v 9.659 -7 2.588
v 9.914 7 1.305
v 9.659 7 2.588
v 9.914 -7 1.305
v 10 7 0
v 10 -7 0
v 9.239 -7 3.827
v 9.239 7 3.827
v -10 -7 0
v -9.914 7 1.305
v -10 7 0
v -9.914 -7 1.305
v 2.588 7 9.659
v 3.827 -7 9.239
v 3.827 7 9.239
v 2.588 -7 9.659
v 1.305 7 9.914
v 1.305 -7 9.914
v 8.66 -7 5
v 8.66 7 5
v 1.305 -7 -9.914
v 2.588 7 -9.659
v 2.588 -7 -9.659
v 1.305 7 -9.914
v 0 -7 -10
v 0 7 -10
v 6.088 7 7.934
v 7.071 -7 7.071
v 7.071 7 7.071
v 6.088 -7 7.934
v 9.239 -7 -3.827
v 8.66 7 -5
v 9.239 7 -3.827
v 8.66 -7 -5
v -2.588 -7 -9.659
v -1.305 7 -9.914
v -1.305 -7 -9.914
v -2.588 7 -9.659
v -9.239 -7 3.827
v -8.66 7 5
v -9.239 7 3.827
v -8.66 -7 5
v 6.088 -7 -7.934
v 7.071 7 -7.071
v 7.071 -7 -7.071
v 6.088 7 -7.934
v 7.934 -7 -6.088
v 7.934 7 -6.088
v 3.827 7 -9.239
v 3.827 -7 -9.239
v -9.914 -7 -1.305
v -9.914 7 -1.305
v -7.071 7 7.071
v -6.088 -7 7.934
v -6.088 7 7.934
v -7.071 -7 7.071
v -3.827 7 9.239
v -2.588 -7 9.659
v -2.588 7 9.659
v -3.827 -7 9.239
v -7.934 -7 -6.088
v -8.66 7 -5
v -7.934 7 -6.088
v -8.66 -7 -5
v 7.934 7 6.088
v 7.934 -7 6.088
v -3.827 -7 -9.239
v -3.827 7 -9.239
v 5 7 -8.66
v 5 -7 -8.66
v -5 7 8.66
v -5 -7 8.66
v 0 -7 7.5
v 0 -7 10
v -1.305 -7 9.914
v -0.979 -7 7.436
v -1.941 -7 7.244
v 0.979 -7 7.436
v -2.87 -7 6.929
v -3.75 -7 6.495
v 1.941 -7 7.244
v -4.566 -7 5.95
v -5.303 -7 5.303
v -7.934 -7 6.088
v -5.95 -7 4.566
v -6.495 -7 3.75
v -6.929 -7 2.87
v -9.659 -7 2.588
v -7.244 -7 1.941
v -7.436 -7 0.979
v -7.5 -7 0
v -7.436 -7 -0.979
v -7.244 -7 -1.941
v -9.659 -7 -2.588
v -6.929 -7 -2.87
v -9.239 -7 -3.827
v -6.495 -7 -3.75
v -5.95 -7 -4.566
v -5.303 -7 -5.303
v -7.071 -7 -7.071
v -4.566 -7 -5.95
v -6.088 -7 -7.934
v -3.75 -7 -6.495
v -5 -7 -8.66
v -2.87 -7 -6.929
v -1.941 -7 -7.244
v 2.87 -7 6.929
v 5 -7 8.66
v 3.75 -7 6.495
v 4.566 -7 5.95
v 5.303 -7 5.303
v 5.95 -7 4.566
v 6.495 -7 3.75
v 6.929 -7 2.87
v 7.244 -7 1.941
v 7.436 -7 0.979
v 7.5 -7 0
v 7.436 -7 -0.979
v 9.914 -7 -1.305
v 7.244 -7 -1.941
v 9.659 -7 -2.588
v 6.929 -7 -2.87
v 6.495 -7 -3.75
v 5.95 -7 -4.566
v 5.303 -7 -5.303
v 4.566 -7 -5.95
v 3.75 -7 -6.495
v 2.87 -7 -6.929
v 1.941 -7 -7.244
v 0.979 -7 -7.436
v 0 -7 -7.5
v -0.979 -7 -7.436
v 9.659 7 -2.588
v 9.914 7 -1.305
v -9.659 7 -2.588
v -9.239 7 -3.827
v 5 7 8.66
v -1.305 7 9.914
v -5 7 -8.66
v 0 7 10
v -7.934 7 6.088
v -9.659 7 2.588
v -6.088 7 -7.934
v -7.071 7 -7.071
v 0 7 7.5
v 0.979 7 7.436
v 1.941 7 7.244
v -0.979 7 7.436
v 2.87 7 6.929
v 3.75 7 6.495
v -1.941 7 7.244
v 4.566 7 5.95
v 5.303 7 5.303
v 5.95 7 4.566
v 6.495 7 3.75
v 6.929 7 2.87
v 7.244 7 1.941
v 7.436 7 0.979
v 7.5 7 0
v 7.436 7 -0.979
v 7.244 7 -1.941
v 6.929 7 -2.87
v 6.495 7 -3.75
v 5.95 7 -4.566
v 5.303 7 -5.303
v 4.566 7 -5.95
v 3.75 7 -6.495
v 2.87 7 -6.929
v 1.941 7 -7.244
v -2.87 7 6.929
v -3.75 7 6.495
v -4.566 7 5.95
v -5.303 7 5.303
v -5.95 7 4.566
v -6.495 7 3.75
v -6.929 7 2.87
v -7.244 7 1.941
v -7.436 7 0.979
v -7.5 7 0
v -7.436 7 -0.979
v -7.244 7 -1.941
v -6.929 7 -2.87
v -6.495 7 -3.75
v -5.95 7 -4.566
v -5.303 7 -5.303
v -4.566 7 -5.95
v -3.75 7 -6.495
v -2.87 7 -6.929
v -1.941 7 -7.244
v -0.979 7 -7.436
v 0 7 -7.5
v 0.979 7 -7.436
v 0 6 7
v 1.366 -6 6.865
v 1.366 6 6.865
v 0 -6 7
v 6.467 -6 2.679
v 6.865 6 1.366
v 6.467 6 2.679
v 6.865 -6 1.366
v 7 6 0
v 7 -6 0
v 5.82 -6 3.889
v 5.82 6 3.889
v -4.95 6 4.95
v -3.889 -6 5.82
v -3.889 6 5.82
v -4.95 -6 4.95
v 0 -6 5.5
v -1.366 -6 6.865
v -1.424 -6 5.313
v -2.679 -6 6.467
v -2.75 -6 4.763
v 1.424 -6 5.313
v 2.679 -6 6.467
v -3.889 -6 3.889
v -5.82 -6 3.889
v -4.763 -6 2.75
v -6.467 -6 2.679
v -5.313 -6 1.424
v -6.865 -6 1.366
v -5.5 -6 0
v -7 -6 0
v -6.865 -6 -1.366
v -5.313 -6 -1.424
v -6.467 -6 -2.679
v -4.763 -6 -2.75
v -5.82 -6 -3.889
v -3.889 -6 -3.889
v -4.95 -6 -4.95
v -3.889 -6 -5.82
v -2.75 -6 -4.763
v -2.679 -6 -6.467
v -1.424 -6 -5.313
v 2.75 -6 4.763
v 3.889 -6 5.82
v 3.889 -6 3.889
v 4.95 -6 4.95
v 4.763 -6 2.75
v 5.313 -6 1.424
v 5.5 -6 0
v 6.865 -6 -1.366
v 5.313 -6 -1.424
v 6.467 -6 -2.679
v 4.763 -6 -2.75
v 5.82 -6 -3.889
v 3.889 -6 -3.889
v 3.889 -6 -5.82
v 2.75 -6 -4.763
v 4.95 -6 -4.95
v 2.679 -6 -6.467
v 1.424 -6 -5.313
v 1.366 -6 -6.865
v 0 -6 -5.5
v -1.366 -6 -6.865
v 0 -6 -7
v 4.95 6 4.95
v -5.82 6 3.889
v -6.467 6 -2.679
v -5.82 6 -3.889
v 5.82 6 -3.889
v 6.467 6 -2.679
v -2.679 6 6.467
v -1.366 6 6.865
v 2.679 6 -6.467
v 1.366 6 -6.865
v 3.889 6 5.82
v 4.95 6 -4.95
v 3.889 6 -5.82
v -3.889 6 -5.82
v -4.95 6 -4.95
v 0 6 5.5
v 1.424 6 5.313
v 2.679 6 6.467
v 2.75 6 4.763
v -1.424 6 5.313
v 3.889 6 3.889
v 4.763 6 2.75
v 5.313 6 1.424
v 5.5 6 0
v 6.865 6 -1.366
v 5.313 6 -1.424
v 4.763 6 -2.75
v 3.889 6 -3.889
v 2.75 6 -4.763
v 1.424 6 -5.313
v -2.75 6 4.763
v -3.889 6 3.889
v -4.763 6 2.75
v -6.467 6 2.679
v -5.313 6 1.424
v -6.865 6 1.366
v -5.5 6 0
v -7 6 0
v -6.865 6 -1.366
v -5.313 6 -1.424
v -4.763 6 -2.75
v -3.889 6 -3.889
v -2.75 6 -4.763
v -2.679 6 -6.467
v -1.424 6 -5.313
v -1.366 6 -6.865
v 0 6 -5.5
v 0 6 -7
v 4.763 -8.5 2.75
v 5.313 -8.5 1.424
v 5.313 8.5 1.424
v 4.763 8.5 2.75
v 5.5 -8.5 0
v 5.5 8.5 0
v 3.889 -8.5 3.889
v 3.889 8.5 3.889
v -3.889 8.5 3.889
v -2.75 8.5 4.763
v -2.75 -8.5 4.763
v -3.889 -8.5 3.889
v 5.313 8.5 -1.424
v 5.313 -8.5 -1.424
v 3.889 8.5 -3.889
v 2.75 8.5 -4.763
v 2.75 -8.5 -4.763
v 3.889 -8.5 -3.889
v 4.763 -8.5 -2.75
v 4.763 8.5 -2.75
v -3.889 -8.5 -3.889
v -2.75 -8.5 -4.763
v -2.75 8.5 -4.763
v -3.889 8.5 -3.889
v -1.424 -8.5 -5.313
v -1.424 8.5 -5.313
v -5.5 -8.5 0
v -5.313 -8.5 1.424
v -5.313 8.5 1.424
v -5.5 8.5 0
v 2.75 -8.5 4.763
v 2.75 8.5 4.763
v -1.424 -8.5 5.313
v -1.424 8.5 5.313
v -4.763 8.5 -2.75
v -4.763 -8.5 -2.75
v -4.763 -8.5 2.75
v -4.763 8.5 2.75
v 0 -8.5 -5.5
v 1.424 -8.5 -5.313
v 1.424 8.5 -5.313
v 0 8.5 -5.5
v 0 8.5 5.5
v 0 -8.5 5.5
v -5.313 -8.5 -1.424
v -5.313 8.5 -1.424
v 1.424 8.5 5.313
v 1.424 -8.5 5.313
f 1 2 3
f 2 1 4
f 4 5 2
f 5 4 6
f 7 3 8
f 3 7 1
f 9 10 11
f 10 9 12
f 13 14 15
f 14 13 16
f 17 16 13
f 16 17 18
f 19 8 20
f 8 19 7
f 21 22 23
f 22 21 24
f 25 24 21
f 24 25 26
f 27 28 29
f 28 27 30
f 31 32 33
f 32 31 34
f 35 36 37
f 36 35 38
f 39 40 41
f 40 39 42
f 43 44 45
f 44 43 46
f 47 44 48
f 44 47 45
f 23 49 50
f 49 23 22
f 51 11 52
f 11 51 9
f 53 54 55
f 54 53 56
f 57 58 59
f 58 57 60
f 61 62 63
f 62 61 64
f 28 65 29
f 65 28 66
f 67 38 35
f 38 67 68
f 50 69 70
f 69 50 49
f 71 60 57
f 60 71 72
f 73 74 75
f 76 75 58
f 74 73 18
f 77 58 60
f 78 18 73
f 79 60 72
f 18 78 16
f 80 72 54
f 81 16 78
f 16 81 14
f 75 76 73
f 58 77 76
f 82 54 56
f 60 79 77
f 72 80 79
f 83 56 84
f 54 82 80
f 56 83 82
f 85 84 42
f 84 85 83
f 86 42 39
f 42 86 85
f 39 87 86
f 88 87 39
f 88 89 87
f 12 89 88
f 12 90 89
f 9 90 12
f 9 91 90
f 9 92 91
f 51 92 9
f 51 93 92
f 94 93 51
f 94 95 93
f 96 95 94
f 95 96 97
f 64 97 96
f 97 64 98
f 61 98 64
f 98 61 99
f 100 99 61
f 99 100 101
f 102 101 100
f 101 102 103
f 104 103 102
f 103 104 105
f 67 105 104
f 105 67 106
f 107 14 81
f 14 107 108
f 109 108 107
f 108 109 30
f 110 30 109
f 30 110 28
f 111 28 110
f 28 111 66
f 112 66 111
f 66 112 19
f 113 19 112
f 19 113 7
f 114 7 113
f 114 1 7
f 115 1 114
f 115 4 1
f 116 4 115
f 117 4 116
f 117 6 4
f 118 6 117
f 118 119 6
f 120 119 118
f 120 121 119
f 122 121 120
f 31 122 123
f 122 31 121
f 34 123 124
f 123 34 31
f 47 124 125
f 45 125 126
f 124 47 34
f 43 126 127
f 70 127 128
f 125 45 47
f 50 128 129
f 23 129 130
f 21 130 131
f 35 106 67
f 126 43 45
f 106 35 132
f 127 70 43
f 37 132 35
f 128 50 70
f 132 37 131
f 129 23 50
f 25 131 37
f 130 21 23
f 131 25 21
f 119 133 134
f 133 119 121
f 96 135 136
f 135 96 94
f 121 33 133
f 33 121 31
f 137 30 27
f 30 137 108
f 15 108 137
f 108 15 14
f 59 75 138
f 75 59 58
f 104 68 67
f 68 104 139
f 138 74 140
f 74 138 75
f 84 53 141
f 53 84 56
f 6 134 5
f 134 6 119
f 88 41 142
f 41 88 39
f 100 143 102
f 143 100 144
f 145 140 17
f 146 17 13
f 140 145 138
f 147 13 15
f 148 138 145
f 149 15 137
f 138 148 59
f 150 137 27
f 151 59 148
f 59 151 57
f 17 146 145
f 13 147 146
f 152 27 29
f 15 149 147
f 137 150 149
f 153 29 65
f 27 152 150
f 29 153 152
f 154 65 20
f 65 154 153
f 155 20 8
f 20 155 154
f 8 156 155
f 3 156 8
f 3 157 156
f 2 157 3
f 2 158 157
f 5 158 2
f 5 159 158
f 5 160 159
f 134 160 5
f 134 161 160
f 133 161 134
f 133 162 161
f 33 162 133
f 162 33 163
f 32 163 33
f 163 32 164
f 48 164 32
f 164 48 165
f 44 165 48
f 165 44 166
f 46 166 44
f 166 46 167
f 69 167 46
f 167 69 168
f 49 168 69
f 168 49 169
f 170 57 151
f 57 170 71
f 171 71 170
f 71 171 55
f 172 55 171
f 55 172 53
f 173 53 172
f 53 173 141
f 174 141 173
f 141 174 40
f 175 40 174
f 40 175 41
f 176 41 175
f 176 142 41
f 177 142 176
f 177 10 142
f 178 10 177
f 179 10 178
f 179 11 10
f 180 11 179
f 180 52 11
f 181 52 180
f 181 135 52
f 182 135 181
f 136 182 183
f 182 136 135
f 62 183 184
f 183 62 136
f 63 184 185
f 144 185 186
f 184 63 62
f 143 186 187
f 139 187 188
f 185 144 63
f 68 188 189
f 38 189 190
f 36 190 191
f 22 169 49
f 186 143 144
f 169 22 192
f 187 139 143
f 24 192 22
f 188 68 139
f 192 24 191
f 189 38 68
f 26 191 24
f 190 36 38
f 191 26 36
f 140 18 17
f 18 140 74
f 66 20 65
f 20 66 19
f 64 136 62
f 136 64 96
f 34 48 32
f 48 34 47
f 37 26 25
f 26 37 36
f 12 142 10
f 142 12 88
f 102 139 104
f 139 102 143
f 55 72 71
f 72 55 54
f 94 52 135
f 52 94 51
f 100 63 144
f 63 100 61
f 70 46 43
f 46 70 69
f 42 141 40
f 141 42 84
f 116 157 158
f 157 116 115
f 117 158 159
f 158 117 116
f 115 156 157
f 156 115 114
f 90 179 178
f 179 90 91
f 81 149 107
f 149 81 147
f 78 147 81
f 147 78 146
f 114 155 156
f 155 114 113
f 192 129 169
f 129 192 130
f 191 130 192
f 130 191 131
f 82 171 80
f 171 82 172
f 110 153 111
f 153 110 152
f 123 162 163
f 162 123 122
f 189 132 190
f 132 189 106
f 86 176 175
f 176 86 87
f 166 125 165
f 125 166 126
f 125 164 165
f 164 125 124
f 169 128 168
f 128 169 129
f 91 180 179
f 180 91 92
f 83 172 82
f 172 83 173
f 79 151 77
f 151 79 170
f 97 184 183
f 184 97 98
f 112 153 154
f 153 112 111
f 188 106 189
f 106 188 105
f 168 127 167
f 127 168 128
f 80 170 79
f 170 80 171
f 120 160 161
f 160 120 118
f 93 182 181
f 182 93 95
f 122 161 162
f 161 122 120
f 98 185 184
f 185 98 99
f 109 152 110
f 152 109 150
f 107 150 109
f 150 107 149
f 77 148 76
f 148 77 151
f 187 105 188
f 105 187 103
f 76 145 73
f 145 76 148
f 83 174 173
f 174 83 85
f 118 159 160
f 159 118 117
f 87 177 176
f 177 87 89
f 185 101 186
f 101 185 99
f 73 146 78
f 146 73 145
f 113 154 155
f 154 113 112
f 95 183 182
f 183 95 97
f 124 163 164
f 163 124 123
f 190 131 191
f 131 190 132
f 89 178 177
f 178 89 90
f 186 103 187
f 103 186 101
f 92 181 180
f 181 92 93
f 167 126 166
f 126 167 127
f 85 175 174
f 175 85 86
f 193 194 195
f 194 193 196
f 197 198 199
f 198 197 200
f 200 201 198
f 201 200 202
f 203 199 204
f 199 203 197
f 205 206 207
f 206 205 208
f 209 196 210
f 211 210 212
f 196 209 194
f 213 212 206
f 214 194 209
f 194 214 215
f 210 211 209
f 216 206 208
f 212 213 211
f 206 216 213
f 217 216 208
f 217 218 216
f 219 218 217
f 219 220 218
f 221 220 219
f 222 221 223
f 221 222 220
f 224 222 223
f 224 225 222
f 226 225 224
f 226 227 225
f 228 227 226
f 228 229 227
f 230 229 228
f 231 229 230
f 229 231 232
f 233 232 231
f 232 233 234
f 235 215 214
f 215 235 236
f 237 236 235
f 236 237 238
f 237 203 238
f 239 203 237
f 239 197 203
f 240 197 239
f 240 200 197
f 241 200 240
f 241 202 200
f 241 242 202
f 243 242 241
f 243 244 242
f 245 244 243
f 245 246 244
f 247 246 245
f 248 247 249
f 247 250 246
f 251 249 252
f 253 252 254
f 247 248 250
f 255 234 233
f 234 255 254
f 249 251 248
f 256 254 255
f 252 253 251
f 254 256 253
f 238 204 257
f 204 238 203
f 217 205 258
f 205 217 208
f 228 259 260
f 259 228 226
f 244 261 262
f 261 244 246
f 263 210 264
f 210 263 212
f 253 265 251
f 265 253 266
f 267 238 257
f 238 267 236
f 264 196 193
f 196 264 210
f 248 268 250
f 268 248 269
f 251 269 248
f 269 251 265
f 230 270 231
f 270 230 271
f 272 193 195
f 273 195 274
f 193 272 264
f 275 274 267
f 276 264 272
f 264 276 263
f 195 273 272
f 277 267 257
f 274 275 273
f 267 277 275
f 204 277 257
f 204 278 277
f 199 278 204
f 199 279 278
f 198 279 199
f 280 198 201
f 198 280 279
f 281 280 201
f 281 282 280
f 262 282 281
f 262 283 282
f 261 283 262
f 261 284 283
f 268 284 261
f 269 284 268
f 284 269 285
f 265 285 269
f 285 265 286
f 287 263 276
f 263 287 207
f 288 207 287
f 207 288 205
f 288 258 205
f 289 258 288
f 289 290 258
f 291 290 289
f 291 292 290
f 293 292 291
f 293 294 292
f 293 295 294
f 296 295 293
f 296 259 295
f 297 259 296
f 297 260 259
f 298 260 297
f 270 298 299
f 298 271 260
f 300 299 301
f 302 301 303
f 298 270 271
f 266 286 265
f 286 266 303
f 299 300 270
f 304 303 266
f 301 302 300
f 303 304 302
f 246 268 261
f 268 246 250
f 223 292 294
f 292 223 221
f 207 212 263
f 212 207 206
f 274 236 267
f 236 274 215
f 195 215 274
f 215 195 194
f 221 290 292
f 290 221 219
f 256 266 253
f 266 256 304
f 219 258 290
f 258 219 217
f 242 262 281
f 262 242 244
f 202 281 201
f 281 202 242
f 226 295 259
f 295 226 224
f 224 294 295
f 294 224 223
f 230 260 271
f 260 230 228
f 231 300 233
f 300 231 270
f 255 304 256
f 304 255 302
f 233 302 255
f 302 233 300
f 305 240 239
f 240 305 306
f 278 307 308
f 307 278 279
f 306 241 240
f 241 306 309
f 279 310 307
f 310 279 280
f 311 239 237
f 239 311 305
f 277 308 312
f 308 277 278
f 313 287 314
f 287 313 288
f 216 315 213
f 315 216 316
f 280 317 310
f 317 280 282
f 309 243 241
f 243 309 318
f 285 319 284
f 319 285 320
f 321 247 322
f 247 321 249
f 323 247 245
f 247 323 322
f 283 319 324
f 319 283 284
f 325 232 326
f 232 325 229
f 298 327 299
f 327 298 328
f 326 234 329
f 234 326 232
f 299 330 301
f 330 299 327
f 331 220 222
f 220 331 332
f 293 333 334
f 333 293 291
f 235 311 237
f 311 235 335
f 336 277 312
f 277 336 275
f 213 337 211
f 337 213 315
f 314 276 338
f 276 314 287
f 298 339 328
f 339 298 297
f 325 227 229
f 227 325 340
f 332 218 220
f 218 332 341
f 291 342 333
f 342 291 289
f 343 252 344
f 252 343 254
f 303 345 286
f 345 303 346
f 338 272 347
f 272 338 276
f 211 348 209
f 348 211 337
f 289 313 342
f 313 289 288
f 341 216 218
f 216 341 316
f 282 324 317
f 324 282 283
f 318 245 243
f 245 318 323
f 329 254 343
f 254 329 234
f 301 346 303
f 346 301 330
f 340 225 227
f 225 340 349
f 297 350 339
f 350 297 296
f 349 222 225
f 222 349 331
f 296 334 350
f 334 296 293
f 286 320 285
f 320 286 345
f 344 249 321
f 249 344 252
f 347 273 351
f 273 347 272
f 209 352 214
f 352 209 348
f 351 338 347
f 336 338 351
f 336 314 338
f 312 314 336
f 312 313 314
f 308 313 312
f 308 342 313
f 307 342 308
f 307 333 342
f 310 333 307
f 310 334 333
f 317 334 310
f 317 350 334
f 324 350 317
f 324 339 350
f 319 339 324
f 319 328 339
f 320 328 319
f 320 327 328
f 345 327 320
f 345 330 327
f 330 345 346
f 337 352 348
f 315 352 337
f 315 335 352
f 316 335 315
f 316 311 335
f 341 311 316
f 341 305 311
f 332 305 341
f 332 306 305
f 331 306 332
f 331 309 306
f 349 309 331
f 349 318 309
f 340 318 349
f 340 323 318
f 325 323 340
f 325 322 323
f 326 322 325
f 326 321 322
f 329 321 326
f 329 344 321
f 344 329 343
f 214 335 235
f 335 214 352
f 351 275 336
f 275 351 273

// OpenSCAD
// file: wheel.scad
include <parameters.scad>

module wheel(r, width, idler = false) {
    rotate([90, 0, 0]) {
        color(matRubber)
            difference() {
                cylinder(r = r, h = width, center = true, $fn = 48);
                cylinder(r = r - 2.5, h = width + 1, center = true, $fn = 48);
            }

        color(matAluminum)
            cylinder(r = r - 3, h = width - 2, center = true, $fn = 32);

        color(matAluminum)
            cylinder(r = idler ? 5.5 : 4.5, h = width + 3, center = true, $fn = 24);

        for (i = [0 : 5])
            rotate([0, 0, i * 60])
                color(matAluminum)
                    cube([2.5, 3, width - 1], center = true);
    }
}

module driveWheel(r, width) {
    wheel(r, width, true);

    rotate([90, 0, 0])
        for (i = [0 : 11])
            rotate([0, 0, i * 30])
                color(matDarkSteel)
                    translate([r - 0.5, 0, 0])
                        cube([4, width + 2, 3.5], center = true);
}
// file: parameters.scad
// Shared parameters for tracked wheelchair prototype
// NOTE: 1 unit = 1 cm (seat target 450 mm = 45 units above ground).
$fn = 48;

//================ MATERIALS =================//
// Frame: aluminum 6061-T6 (lightweight)
// Seat: carbon fiber T700 + honeycomb (ultralight)
// Suspension: rubber bushings (lightweight)
// Axles: aluminum 7075-T6 (1/3 weight of steel)
matSteel      = [0.35, 0.36, 0.38];   // hardware / fasteners only
matDarkSteel  = [0.25, 0.26, 0.28];
matRubber     = [0.12, 0.12, 0.14];   // track belt + bushings
matAluminum   = [0.55, 0.57, 0.60];   // primary frame material
matChrome     = [0.70, 0.72, 0.75];
matCarbon     = [0.15, 0.15, 0.18];   // (unused — seat now aluminum)
matLeather    = [0.45, 0.25, 0.12];   // leather cushion color

//================ TRACKS =================//
trackLength = 82;
trackWidth = 14;
trackCenterY = 28;

idlerRadius = 10;
idlerX = trackLength / 2;
idlerZ = 16;
roadRadius = 7;
roadZ = 13;  // road wheels roll on the belt's inner surface (belt upper edge at this height)
roadPositions = [-22, -6, 10, 24];

linkLength = 10;
linkWidth = trackWidth + 2;
linkThickness = 3;
linkGap = 1;
// Belt centerline clears the idler wheels plus link half-thickness,
// so the links ride on the wheels instead of clipping through them.
trackRadius = idlerRadius + linkThickness / 2;  // = 11.5
beltThickness = 3;
groundZ = idlerZ - trackRadius;  // bottom of track = ground level (4.5)

//================ HYDRAULIC JACK WHEEL =================//
trackTilt = 0;
liftPivotX = idlerX;
liftPivotZ = idlerZ;
// Electric linear actuator (24V DC, 500kg, 300mm stroke).
// 1/3 weight of hydraulic system.
hydrWheelRadius = 4;
hydrWheelWidth = 10;
hydrBarrelRadius = 4;        // smaller barrel (mini actuator)
hydrBarrelHeight = 12;       // shorter barrel
hydrRodRadius = 2;
// At full extension the jack wheel rests on the ground:
// mountZ 35 - groundZ 4.5 - wheelR 4 = 26.5
hydrExtend = 26.5;
hydrRetracted = 0;
hydrExtendAmount = hydrExtend;
hydrMountX = 10;   // jack mount x; moved forward (from 24) for first-stair clearance
hydrMountY = 0;

//================ CHASSIS =================//
chassisLength = 82;
chassisBottom = 35;
chassisHeight = 12;

//================ SEAT =================//
// Seat geometry: flat aluminium pan + leather cushion + slim backrest.
// Seat surface rides at 450 mm (45 units) above the ground.
// topZ = idlerZ + seatTopOffset = 49.5, ground at 4.5 -> seat 45 above ground.
seatPanLength = 66;
seatPanWidth = 66;
backShellHeight = 72;
headrestHeight = 16;
seatTopOffset = 45 - trackRadius;  // = 33.5
// Backrest recline (deg from vertical).
seatBackRecline = 8;

//================ FOOTREST =================//
footrestWidth = 34;
footrestLength = 28;
footrestThickness = 3;       // 3mm aluminum plate
footrestHeight = idlerZ + 12;
footrestFrontX = -30 - footrestLength / 2;  // plate center, extends forward from arm end

// Folding footplate pivots at the end of the L-bracket arm.
footPivotX = -30;                           // end of L-bracket horizontal arm
footPivotZ = idlerZ + seatTopOffset - 7;    // arm height (panB - 2)
footHeelGuard = true;                       // optional heel guard
footToeGuard = false;                       // optional toe guard (off by default)

//================ ARMRESTS =================//
armPivotX = idlerX - 14;                     // rear post at the seat back
armLength = 68;                              // full-length pad (covers seat depth)
armPadHeight = idlerZ + seatTopOffset + 19;  // pad top = elbow height (~19 above seat top)
armPadWidth = 8;
armPadThick = 4;
// main file
// STL EXPORT: Idler wheel (single)
include <parameters.scad>
use <wheel.scad>
wheel(idlerRadius, trackWidth, true);
